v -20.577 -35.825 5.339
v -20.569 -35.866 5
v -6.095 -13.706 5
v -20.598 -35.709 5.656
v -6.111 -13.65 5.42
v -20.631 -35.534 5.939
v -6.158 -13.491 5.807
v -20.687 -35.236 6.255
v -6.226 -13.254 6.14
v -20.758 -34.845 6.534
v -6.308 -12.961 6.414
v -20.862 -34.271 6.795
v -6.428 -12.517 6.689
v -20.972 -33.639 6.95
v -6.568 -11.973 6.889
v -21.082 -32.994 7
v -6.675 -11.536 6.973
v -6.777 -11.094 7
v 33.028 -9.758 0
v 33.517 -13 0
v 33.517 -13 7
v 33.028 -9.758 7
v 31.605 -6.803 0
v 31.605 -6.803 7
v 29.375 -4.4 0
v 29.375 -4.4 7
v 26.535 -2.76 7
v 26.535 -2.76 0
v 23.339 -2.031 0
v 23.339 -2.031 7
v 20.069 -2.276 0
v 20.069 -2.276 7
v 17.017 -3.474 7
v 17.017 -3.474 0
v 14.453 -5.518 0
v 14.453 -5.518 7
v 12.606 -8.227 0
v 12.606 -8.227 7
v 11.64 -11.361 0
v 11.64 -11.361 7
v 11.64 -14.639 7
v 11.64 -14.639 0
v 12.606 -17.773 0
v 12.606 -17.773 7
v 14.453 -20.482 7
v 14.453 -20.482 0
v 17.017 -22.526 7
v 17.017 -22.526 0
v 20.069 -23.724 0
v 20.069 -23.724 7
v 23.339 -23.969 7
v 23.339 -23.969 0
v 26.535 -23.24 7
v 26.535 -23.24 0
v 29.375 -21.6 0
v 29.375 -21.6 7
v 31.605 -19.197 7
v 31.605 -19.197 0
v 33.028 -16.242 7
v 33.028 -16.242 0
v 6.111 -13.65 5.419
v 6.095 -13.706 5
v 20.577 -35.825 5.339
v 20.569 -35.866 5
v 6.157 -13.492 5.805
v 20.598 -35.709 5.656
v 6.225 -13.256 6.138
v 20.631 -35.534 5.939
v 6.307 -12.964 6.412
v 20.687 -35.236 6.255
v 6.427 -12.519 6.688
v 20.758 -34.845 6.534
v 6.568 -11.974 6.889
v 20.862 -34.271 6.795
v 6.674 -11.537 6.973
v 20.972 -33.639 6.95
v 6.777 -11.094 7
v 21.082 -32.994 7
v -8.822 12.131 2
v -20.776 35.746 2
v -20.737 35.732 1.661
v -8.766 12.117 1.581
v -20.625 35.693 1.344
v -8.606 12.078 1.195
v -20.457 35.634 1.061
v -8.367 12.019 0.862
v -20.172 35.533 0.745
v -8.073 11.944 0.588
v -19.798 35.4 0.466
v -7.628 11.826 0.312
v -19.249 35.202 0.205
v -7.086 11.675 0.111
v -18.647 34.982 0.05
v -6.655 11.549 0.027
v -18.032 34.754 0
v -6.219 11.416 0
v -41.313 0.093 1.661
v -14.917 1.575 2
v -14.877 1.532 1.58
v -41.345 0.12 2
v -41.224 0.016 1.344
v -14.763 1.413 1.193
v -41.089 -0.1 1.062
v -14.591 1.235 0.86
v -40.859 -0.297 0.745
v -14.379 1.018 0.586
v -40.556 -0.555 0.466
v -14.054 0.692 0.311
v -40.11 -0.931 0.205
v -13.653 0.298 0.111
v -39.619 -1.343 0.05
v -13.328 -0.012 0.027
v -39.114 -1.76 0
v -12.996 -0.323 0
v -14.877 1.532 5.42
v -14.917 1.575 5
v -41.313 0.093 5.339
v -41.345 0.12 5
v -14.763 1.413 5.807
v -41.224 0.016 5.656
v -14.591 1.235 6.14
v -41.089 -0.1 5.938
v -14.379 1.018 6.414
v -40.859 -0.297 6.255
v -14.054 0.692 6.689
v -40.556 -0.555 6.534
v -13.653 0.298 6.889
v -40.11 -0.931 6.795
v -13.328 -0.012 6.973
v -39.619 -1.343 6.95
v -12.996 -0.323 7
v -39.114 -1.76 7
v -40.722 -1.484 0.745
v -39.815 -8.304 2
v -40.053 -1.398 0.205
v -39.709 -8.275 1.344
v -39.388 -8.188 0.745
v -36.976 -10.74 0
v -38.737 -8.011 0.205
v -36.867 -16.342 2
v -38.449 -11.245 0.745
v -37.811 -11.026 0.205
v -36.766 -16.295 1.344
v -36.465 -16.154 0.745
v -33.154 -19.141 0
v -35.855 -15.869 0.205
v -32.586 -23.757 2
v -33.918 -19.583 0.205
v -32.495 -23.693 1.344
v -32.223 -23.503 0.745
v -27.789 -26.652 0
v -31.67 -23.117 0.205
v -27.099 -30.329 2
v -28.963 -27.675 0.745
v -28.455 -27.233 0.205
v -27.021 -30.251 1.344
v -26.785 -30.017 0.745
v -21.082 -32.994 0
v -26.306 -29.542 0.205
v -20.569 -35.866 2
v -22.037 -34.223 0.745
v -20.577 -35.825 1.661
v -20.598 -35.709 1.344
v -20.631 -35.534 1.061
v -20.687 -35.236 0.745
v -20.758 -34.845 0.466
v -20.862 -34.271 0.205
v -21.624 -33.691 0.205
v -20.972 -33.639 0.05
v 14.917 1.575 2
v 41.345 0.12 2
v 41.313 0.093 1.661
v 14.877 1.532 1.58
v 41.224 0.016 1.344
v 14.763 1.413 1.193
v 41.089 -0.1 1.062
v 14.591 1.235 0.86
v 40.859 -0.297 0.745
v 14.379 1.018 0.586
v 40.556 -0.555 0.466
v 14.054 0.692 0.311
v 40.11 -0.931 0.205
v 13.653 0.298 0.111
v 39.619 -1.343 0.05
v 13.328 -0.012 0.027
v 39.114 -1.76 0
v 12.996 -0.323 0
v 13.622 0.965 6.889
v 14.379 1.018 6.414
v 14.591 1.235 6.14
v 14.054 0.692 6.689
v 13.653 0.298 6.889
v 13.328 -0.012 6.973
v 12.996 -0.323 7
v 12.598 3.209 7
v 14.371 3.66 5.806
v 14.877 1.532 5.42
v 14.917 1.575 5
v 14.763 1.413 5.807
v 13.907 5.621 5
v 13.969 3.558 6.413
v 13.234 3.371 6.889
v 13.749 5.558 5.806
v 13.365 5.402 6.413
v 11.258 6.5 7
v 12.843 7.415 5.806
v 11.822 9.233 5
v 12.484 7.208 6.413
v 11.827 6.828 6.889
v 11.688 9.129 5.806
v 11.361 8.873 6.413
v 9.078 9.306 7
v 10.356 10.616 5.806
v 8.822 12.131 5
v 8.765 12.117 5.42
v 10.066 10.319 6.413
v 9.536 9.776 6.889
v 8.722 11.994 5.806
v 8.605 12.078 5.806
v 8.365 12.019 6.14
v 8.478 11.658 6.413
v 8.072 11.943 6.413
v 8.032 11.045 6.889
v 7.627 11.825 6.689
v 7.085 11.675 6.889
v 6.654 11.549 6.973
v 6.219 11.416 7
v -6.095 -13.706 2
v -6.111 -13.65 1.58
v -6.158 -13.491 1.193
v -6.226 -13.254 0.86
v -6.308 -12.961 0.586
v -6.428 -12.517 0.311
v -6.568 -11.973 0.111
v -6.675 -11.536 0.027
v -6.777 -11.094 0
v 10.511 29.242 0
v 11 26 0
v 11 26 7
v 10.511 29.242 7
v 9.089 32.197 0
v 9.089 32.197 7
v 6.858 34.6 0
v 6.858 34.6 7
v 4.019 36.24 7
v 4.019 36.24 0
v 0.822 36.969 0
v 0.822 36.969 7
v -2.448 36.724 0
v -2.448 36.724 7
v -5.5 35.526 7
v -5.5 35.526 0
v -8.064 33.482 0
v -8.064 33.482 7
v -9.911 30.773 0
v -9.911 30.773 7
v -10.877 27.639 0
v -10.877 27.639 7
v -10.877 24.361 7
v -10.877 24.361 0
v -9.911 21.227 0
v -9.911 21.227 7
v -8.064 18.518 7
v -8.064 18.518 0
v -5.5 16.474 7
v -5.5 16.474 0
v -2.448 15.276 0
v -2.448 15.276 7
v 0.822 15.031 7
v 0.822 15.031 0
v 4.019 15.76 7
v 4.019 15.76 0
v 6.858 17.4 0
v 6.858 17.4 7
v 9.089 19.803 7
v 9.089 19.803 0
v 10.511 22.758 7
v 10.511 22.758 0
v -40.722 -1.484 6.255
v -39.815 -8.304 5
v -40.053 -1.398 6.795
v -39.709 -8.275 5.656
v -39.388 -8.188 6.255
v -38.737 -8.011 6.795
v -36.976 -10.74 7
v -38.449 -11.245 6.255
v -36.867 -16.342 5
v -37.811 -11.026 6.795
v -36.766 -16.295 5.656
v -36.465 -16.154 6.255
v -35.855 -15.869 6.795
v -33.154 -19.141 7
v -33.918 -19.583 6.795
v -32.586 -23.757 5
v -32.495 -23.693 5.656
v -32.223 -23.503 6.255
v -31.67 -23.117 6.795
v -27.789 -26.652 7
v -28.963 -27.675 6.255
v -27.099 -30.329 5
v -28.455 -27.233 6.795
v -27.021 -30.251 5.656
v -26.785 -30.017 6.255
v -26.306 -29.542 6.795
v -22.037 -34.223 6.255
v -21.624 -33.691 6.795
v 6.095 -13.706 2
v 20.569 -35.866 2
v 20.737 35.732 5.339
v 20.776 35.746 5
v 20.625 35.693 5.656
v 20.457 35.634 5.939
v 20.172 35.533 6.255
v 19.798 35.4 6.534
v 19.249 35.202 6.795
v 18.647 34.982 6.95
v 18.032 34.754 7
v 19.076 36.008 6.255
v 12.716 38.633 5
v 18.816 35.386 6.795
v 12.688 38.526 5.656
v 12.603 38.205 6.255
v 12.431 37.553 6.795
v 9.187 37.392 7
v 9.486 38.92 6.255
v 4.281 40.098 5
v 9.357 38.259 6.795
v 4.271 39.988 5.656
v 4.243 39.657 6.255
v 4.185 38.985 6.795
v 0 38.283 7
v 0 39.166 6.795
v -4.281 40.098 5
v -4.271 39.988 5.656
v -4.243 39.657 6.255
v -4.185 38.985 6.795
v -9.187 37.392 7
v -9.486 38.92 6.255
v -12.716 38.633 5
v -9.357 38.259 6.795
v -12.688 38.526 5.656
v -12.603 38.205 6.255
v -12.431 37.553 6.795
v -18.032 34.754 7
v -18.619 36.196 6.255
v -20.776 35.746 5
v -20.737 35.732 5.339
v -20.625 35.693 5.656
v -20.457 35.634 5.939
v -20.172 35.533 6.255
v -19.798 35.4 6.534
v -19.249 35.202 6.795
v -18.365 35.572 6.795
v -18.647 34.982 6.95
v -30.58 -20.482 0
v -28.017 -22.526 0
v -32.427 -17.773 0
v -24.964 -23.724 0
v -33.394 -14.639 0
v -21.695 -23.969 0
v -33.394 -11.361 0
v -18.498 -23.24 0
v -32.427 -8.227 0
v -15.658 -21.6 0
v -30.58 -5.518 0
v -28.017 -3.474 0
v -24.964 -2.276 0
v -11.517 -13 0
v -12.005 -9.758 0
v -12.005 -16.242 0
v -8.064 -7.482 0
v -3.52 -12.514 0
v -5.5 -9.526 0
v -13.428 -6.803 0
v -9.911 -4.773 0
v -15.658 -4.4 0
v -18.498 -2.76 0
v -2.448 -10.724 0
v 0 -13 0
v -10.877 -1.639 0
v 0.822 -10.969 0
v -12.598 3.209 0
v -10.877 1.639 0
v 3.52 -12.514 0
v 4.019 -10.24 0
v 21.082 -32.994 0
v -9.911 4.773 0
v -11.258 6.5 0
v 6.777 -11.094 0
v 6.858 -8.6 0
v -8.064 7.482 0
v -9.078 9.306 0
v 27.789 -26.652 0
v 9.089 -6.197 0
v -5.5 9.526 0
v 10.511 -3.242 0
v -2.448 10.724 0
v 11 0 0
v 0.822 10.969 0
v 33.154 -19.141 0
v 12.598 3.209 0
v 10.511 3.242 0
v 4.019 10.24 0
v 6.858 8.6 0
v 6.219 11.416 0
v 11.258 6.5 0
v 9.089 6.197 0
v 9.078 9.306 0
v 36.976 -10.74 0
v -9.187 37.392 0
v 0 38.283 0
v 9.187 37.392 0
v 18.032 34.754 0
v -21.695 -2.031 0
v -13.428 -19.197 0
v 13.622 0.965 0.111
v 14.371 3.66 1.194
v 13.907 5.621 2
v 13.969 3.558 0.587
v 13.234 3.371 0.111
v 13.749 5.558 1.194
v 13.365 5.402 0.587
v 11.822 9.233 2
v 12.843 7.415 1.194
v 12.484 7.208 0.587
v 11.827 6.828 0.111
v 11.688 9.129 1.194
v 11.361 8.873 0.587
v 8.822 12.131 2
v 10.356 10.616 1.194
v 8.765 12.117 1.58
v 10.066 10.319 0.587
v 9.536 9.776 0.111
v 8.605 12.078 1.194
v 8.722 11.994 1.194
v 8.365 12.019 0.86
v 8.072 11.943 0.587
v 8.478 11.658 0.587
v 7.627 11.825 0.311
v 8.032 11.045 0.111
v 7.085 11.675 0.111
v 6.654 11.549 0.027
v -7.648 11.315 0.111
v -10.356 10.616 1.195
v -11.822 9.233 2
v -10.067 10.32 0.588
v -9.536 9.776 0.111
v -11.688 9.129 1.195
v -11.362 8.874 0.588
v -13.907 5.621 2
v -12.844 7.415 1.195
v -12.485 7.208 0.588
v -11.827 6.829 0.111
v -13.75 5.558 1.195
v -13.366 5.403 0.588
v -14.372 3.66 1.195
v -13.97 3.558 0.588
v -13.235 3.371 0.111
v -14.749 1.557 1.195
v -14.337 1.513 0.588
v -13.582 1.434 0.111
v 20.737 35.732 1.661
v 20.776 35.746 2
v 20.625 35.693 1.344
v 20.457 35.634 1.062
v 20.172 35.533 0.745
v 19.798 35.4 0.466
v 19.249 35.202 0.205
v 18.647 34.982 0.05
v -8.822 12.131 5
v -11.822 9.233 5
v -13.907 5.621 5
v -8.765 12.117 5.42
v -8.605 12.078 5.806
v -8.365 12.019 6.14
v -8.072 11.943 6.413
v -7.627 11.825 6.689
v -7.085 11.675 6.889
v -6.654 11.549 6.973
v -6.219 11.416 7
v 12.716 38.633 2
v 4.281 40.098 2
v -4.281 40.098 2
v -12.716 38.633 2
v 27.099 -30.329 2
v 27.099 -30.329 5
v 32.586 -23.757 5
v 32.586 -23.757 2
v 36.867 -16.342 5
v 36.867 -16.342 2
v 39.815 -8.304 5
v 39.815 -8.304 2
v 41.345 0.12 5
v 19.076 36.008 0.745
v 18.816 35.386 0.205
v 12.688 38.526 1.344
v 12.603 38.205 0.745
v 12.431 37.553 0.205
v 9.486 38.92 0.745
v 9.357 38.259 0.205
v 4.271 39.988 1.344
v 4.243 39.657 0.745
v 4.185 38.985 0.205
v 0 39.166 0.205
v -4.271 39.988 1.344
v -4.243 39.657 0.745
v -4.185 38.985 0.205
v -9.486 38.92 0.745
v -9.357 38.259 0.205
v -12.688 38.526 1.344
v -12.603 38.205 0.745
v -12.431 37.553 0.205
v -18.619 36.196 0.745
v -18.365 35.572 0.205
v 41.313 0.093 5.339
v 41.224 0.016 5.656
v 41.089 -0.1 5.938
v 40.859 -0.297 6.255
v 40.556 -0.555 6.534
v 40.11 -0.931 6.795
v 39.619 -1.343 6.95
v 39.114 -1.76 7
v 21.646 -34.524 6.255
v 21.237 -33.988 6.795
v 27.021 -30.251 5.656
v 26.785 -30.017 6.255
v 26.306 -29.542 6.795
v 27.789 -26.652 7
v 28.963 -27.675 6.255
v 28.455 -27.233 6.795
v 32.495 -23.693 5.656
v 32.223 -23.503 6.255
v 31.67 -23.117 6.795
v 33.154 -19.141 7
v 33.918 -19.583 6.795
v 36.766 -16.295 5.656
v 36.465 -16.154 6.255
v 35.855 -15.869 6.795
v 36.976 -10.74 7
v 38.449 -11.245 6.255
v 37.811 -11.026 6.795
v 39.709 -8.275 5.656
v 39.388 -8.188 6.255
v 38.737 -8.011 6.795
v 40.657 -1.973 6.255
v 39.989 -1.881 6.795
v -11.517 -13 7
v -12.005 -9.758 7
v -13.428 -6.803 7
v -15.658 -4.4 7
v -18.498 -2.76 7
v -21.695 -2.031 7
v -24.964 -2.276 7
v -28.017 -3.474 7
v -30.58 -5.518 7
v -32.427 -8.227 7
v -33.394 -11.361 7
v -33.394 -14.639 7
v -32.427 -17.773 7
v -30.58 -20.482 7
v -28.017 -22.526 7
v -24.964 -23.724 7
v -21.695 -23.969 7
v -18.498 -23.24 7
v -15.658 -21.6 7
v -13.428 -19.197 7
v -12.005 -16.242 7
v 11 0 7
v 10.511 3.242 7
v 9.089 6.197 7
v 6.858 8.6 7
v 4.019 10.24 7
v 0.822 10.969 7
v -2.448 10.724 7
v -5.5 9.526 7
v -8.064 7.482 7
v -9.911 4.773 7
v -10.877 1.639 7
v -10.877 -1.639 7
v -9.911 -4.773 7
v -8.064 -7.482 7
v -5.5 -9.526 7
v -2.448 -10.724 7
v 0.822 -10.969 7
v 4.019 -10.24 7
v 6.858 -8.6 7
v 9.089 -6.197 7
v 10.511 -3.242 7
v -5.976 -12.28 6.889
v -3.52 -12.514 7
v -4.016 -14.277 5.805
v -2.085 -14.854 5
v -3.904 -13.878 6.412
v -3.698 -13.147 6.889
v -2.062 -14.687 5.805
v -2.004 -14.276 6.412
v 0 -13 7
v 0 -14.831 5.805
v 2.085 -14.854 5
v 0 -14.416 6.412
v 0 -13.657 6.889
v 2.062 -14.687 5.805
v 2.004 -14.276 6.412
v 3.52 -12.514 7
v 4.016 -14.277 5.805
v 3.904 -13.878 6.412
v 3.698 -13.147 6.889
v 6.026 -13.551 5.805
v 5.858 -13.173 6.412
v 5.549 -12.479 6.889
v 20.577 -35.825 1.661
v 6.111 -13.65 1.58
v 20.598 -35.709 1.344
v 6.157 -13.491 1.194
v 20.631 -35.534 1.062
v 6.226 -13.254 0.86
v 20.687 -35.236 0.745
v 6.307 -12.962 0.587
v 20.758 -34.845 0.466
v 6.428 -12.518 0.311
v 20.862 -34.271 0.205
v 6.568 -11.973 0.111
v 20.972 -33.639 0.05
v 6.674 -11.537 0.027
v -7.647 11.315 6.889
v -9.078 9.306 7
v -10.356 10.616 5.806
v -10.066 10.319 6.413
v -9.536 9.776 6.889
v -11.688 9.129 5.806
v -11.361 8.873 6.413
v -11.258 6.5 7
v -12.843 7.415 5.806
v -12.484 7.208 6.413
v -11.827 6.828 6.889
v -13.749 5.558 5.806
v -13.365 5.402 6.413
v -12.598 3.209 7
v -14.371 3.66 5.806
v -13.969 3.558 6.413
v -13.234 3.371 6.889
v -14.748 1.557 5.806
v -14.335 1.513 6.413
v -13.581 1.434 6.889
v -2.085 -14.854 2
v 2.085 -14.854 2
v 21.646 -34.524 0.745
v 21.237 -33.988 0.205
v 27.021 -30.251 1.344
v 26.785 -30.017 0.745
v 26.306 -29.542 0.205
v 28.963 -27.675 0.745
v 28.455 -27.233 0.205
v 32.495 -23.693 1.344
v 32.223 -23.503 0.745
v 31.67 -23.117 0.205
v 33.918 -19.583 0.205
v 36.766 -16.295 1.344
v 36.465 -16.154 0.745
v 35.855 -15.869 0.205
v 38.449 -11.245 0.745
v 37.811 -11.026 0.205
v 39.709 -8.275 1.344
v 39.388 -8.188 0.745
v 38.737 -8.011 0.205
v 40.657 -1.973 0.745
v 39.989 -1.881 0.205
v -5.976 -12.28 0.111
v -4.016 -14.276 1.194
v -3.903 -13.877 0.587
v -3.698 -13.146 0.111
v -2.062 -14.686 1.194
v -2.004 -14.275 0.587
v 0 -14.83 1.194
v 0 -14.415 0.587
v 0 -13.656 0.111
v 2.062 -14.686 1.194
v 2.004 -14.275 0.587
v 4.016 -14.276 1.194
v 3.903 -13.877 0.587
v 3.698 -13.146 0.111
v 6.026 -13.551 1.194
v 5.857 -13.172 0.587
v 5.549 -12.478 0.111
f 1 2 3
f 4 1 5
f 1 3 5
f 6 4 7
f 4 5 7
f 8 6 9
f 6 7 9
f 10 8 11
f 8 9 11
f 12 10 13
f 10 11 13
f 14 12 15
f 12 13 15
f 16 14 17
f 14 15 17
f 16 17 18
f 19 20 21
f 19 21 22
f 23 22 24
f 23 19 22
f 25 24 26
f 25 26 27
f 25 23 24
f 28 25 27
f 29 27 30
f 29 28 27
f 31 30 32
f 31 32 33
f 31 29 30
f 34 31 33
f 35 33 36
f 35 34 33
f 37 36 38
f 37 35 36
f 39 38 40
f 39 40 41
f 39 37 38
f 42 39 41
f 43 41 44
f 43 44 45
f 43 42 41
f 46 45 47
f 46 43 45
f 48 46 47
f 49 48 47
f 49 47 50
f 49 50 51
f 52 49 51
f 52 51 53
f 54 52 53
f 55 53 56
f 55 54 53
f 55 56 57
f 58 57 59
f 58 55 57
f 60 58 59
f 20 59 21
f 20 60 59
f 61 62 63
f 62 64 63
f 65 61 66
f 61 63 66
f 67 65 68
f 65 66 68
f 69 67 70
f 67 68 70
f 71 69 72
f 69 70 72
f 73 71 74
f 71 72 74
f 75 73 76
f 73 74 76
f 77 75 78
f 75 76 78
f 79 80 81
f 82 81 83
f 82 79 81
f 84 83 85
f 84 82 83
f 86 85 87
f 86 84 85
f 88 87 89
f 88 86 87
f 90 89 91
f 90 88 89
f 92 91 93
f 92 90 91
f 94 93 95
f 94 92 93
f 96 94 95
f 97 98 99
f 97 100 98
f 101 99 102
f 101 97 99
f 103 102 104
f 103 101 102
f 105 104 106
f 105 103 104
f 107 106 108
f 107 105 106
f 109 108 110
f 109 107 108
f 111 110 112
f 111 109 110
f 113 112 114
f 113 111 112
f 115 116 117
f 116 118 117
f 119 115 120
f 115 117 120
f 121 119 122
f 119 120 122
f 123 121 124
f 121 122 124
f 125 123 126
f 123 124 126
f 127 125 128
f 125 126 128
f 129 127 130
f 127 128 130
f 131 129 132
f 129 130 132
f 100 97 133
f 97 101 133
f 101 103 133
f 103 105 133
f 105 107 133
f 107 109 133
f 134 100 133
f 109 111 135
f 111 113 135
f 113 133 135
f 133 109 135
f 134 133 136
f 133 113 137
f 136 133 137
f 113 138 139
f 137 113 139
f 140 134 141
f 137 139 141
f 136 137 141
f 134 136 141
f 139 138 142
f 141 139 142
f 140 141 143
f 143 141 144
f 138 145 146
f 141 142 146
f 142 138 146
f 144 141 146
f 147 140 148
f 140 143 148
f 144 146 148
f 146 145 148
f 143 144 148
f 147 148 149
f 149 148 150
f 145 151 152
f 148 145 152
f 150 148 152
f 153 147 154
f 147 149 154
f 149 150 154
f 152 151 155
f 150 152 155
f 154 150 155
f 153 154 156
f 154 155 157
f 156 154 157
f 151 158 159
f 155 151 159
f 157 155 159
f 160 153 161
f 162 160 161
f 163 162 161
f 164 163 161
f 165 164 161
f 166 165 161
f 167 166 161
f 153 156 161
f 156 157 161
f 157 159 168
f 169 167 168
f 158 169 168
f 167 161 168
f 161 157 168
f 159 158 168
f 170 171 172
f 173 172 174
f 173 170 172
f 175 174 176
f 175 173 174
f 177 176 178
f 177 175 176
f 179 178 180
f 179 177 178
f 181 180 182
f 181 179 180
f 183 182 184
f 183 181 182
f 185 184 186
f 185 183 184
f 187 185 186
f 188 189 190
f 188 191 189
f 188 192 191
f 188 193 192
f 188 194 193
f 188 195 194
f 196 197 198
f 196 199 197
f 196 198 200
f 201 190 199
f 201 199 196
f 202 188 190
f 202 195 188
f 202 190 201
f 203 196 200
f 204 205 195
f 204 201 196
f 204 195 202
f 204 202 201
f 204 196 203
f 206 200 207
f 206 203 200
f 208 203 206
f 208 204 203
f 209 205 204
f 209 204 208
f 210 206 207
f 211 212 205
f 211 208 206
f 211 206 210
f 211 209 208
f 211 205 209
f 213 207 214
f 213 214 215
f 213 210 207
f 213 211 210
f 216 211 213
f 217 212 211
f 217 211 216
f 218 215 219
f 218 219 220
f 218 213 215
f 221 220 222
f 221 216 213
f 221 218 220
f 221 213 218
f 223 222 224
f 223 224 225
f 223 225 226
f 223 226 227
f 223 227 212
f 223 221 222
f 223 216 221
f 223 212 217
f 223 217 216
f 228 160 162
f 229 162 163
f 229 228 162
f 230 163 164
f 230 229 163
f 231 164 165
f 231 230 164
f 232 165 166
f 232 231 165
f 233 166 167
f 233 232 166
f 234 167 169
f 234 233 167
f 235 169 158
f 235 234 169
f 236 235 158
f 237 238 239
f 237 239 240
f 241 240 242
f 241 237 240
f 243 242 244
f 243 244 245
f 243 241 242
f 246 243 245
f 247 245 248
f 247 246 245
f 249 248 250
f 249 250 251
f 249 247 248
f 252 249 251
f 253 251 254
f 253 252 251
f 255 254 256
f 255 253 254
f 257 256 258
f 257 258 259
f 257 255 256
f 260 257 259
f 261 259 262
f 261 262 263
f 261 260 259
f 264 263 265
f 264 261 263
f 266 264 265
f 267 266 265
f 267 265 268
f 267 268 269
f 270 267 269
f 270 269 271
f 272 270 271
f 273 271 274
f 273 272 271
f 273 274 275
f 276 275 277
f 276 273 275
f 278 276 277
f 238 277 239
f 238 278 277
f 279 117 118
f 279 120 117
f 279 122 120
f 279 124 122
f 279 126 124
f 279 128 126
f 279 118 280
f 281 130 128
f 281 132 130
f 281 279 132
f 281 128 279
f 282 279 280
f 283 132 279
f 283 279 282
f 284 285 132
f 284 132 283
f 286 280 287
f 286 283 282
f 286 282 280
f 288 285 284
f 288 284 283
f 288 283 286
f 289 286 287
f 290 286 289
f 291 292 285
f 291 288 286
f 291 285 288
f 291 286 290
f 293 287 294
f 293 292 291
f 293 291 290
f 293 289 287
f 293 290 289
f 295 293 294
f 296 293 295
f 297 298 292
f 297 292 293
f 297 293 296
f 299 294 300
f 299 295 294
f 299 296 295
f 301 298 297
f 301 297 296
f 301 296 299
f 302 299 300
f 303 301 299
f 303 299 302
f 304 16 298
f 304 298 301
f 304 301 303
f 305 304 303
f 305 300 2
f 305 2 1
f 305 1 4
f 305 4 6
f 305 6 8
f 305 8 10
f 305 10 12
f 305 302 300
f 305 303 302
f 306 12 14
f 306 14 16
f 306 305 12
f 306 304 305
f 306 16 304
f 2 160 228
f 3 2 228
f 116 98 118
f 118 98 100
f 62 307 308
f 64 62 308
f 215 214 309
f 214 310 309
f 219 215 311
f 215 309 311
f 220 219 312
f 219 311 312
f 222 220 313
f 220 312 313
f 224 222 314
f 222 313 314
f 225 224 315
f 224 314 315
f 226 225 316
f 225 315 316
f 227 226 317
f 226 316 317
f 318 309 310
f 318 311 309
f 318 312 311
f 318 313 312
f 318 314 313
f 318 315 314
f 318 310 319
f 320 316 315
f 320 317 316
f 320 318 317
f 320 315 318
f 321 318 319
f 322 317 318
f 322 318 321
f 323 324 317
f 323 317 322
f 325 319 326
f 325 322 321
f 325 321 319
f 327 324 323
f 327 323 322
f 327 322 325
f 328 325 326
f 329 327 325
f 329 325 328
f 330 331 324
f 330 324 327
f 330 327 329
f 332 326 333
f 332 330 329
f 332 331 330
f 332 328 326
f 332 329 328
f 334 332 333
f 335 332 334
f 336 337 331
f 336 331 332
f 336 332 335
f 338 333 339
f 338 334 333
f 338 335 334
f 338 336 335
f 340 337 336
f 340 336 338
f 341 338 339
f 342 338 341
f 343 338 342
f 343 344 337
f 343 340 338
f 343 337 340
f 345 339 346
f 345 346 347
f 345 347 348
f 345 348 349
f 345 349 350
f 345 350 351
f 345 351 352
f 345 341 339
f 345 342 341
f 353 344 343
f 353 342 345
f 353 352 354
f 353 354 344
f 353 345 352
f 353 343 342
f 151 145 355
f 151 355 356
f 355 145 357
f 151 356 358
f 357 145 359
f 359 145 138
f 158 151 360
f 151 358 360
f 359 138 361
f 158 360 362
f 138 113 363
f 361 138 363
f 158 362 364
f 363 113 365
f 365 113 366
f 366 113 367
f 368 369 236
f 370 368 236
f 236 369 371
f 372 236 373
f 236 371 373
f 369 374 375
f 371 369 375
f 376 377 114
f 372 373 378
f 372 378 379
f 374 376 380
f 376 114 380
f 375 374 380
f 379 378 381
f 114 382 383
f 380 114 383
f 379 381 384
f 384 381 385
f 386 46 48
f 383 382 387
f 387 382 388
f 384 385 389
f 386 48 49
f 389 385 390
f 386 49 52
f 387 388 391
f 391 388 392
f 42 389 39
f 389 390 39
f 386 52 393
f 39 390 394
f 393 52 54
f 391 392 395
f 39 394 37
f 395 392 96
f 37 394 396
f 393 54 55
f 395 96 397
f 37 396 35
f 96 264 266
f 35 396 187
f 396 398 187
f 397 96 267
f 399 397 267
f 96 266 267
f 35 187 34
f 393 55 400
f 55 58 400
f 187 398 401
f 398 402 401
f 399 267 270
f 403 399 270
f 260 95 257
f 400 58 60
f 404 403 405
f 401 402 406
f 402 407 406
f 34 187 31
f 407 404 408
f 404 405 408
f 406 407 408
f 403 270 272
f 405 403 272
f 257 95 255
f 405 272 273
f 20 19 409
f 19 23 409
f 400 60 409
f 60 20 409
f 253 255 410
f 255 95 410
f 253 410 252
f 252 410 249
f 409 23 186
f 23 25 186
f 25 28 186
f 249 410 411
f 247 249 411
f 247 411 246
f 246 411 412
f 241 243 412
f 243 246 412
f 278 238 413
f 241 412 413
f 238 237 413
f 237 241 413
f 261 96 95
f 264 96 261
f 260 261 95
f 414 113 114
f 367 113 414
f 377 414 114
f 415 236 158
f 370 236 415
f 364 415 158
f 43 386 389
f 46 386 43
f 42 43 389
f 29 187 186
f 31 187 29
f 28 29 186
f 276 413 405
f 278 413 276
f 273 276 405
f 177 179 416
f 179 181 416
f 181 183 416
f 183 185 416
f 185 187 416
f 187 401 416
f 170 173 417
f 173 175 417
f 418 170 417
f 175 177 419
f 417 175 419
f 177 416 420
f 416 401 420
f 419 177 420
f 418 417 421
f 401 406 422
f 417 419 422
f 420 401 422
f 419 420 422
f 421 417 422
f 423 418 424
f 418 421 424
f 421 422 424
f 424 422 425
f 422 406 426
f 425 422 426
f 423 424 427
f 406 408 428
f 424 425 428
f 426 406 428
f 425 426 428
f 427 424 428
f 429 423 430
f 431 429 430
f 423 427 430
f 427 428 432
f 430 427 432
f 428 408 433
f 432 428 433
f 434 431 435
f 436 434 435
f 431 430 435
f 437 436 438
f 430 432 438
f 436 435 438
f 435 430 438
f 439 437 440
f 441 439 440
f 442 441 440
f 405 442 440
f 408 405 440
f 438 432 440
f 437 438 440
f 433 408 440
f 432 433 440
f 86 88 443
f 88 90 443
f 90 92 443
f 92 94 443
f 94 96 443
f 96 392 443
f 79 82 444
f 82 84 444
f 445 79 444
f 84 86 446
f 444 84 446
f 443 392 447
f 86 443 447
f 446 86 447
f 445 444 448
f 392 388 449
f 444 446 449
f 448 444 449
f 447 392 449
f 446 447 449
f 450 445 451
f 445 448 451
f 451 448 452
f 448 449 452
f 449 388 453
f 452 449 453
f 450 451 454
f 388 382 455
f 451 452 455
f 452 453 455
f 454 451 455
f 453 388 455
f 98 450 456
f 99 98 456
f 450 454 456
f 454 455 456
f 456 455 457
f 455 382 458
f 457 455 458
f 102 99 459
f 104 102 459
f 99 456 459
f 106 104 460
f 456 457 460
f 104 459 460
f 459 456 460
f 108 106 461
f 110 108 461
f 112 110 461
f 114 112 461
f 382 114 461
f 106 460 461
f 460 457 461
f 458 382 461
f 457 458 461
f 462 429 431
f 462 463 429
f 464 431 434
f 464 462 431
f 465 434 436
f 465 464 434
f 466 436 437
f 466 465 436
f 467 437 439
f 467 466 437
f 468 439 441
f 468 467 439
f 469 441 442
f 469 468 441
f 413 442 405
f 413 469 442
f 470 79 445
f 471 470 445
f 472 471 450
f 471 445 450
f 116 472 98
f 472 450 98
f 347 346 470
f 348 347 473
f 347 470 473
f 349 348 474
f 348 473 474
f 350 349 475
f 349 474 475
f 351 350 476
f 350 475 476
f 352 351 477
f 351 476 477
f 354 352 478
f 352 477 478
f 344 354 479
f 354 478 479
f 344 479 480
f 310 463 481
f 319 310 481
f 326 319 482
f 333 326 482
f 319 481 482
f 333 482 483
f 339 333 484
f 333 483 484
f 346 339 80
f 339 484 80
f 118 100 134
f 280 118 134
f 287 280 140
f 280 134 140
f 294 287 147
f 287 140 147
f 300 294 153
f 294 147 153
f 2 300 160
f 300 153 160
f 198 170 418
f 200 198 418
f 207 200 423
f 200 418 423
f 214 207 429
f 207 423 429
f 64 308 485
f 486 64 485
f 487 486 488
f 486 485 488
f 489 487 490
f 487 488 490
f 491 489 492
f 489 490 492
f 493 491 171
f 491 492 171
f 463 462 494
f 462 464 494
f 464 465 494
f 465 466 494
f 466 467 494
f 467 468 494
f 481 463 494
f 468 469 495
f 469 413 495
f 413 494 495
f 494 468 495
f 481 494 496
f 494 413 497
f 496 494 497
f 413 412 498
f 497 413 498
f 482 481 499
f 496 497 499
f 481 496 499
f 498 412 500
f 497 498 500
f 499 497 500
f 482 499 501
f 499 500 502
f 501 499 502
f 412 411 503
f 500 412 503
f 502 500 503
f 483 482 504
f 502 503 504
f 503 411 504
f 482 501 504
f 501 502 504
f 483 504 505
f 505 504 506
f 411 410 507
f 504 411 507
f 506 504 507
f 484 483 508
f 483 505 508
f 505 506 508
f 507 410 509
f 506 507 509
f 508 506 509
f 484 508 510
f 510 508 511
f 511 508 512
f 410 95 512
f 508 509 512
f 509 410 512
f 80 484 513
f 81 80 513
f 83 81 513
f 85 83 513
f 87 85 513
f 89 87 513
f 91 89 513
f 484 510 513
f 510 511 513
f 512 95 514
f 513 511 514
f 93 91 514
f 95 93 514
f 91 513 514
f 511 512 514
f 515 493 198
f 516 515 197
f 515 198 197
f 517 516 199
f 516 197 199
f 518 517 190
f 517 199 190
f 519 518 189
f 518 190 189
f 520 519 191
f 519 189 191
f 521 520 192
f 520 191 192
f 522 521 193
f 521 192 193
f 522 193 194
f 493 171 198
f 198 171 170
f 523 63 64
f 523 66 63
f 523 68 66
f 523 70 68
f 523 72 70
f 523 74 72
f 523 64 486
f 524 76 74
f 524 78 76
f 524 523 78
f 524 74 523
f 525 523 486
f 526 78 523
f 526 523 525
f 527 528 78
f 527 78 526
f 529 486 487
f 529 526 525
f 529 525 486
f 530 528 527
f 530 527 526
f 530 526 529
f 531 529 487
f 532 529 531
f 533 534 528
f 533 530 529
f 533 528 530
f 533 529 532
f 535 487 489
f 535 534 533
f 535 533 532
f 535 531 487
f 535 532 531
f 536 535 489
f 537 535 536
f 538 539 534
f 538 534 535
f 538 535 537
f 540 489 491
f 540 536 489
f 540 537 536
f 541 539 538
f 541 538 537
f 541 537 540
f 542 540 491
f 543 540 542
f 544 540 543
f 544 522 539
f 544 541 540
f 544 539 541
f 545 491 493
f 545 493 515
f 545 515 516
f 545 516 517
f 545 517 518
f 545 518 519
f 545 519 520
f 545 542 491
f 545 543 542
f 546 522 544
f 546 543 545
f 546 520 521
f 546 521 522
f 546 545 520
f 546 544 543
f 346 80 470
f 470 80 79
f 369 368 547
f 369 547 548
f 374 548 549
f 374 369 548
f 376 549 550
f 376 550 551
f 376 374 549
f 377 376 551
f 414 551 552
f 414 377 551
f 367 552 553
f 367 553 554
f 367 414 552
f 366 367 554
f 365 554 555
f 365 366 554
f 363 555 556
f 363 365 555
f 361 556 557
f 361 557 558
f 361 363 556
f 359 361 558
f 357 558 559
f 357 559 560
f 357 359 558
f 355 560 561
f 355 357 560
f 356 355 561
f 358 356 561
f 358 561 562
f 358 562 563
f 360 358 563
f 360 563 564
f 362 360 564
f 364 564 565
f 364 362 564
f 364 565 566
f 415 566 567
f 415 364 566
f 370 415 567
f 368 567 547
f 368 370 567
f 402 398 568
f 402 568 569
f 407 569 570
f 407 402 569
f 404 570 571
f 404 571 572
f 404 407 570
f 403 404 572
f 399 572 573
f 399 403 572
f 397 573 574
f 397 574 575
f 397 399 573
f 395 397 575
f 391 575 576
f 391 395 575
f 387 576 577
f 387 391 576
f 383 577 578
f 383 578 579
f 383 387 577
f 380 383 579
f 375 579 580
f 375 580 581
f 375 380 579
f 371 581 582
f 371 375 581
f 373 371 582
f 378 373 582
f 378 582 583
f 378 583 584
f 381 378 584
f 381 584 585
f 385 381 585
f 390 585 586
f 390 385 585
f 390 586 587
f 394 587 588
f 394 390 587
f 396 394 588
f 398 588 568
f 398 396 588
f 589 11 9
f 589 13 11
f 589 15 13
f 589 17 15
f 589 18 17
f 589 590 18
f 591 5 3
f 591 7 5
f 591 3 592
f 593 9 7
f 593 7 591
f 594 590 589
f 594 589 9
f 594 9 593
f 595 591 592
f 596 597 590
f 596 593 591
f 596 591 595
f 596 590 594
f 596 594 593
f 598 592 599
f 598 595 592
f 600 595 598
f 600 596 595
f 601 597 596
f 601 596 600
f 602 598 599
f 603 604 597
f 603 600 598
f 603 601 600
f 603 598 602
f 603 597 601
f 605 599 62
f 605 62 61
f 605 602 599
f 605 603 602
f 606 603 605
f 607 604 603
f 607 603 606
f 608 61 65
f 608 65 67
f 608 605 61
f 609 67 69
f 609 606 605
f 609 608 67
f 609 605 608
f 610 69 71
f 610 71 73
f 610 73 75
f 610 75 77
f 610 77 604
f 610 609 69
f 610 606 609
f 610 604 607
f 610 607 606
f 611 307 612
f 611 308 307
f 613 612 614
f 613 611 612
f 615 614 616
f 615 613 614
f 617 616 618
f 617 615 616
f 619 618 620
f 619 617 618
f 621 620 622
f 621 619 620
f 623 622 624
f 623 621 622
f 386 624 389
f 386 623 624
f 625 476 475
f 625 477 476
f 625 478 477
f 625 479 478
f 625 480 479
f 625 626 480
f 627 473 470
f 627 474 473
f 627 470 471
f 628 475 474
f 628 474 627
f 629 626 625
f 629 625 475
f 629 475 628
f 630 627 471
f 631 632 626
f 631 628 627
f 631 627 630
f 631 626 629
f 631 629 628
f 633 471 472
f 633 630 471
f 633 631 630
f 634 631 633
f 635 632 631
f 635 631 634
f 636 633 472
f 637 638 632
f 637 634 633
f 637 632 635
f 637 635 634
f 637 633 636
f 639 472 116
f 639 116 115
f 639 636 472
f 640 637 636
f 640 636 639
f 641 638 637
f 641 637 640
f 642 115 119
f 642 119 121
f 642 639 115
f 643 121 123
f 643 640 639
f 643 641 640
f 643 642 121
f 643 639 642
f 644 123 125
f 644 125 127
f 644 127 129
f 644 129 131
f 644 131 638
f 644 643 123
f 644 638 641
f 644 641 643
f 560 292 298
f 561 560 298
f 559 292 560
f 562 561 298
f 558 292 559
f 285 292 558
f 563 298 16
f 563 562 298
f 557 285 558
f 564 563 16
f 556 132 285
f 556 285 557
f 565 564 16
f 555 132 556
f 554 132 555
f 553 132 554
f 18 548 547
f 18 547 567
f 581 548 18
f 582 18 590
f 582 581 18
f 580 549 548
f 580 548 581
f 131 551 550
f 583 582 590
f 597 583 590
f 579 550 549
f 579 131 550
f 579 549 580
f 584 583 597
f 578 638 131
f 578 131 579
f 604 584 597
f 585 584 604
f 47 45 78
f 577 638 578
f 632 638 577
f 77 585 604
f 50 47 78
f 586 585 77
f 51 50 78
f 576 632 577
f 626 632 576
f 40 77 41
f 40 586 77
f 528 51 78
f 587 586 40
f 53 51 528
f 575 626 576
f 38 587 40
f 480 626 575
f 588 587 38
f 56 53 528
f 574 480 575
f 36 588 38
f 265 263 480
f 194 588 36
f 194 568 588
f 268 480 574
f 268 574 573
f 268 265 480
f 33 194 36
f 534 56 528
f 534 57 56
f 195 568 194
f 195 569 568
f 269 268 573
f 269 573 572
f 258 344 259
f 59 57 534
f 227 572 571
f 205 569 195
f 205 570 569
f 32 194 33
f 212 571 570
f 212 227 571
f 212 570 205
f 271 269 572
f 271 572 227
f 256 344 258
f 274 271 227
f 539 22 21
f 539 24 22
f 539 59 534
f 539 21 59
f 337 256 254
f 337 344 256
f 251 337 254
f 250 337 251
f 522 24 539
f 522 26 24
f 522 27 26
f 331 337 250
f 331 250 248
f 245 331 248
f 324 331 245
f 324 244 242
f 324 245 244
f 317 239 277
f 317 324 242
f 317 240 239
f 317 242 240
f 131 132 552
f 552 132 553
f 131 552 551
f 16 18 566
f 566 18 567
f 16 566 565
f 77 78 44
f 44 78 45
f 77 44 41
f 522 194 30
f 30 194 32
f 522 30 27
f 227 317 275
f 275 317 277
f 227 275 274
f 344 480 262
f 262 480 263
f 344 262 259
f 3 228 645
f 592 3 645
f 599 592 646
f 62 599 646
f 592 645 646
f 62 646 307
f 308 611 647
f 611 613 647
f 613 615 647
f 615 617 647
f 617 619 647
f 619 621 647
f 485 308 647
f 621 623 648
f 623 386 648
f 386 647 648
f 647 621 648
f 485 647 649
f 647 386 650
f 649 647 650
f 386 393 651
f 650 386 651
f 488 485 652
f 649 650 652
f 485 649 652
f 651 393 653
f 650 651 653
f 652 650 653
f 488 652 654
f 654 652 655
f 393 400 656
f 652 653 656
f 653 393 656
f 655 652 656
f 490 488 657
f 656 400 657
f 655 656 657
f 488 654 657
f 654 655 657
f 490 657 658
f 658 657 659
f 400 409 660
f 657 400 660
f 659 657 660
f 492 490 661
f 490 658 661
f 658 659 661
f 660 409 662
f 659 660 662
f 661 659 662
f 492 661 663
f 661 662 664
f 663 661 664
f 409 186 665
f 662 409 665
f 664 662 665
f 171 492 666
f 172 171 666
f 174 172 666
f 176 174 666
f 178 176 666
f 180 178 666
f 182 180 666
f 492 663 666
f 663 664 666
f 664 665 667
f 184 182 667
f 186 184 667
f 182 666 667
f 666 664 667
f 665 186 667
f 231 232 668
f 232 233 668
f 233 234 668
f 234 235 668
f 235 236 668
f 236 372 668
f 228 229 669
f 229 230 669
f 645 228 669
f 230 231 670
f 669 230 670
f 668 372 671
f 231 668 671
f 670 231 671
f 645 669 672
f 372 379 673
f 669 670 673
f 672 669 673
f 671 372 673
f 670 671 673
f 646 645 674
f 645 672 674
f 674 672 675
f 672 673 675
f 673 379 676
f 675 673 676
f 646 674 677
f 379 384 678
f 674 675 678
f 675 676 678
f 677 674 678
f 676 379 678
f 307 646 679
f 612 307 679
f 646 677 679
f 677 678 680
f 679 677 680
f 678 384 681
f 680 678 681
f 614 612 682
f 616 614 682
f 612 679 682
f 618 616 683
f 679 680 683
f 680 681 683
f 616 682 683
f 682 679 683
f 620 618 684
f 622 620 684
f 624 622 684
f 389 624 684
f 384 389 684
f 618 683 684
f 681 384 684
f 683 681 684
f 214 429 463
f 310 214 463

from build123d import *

# Parameters (mm, degrees)
F0_R     = 11
F1_DEPTH = 7
F2_R     = 2


with BuildPart() as f1:
    # F0 (on Top) → F1 (new body)
    with BuildSketch(Plane.XY):
        with BuildLine():
            Line((-20.5688137101, -35.8657114123), (-6.0947750549, -13.7059737717))
            ThreePointArc((-6.0947750549, -13.7059737717), (0, -15), (6.0947750549, -13.7059737717))
            Line((6.0947750549, -13.7059737717), (20.5688137101, -35.8657114123))
            ThreePointArc((20.5688137101, -35.8657114123), (34.8857895537, -20.1413199897), (41.3450240629, 0.1197405075))
            Line((41.3450240629, 0.1197405075), (14.9171089973, 1.5747568579))
            ThreePointArc((14.9171089973, 1.5747568579), (12.9903810568, 7.5), (8.8223339424, 12.1312169138))
            Line((8.8223339424, 12.1312169138), (20.7762103528, 35.7459709048))
            ThreePointArc((20.7762103528, 35.7459709048), (0, 40.2826399794), (-20.7762103528, 35.7459709048))
            Line((-20.7762103528, 35.7459709048), (-8.8223339424, 12.1312169138))
            ThreePointArc((-8.8223339424, 12.1312169138), (-12.9903810568, 7.5), (-14.9171089973, 1.5747568579))
            Line((-14.9171089973, 1.5747568579), (-41.3450240629, 0.1197405075))
            ThreePointArc((-41.3450240629, 0.1197405075), (-34.8857895537, -20.1413199897), (-20.5688137101, -35.8657114123))
        make_face()
        with Locations((-22.5166604984, -13)):
            Circle(F0_R, mode=Mode.SUBTRACT)
        Circle(F0_R, mode=Mode.SUBTRACT)
        with Locations((22.5166604984, -13)):
            Circle(F0_R, mode=Mode.SUBTRACT)
        with Locations((0, 26)):
            Circle(F0_R, mode=Mode.SUBTRACT)
    extrude(amount=F1_DEPTH)

    # F2
    f2_edges = [f1.edges().sort_by_distance(p)[0] for p in [
        (-12.990381, 7.5, 7),
        (-14.799272, 23.938594, 7),
        (0, 40.28264, 7),
        (14.799272, 23.938594, 7),
        (12.990381, 7.5, 7),
        (28.131067, 0.847249, 7),
        (34.88579, -20.14132, 7),
        (13.331794, -24.785843, 7),
        (0, -15, 7),
        (-13.331794, -24.785843, 7),
        (-34.88579, -20.14132, 7),
        (-28.131067, 0.847249, 7),
        (0, 40.28264, 0),
        (-14.799272, 23.938594, 0),
        (14.799272, 23.938594, 0),
        (12.990381, 7.5, 0),
        (28.131067, 0.847249, 0),
        (13.331794, -24.785843, 0),
        (34.88579, -20.14132, 0),
        (-13.331794, -24.785843, 0),
        (0, -15, 0),
        (-34.88579, -20.14132, 0),
        (-28.131067, 0.847249, 0),
        (-12.990381, 7.5, 0),
    ]]
    fillet(f2_edges, radius=F2_R)


solid = f1.part
